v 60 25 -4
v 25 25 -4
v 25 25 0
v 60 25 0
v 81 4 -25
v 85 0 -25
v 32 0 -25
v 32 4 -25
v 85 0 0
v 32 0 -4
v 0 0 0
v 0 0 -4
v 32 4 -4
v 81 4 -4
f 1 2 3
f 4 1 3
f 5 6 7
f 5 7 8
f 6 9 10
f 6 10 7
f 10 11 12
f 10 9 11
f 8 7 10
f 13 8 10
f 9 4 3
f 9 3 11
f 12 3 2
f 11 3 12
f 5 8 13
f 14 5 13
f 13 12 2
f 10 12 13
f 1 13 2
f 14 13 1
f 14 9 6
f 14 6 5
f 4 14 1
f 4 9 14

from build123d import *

# Parameters (mm, degrees)
EXTRUDE_1_DEPTH     = 85
CUT_EXTRUDE_1_DEPTH = 26
SKETCH_3_W          = 32
SKETCH_3_H          = 21
CUT_EXTRUDE_2_DEPTH = 10


with BuildPart() as part:
    # Эскиз1 → Вытянуть-Тонкостенный1 (new body)
    with BuildSketch(Plane(origin=(0, 0, 0), x_dir=(0, 0, -1), z_dir=(1, 0, 0))):
        Polygon((0, 25), (0, 0), (25, 0), (25, 4), (4, 4), (4, 25), align=None)
    extrude(amount=EXTRUDE_1_DEPTH)

    # Эскиз2 → Вырез-Вытянуть1 (cut, through all)
    with BuildSketch(Plane.XY):
        Polygon((0, 0), (0, 25), (25, 25), align=None)
        Polygon((60, 25), (85, 25), (85, 0), align=None)
    extrude(amount=-CUT_EXTRUDE_1_DEPTH, mode=Mode.SUBTRACT)

    # Эскиз3 → Вырез-Вытянуть2 (cut)
    with BuildSketch(Plane.XZ):
        with Locations((16, -14.5)):
            Rectangle(SKETCH_3_W, SKETCH_3_H)
    extrude(amount=-CUT_EXTRUDE_2_DEPTH, mode=Mode.SUBTRACT)


solid = part.part
